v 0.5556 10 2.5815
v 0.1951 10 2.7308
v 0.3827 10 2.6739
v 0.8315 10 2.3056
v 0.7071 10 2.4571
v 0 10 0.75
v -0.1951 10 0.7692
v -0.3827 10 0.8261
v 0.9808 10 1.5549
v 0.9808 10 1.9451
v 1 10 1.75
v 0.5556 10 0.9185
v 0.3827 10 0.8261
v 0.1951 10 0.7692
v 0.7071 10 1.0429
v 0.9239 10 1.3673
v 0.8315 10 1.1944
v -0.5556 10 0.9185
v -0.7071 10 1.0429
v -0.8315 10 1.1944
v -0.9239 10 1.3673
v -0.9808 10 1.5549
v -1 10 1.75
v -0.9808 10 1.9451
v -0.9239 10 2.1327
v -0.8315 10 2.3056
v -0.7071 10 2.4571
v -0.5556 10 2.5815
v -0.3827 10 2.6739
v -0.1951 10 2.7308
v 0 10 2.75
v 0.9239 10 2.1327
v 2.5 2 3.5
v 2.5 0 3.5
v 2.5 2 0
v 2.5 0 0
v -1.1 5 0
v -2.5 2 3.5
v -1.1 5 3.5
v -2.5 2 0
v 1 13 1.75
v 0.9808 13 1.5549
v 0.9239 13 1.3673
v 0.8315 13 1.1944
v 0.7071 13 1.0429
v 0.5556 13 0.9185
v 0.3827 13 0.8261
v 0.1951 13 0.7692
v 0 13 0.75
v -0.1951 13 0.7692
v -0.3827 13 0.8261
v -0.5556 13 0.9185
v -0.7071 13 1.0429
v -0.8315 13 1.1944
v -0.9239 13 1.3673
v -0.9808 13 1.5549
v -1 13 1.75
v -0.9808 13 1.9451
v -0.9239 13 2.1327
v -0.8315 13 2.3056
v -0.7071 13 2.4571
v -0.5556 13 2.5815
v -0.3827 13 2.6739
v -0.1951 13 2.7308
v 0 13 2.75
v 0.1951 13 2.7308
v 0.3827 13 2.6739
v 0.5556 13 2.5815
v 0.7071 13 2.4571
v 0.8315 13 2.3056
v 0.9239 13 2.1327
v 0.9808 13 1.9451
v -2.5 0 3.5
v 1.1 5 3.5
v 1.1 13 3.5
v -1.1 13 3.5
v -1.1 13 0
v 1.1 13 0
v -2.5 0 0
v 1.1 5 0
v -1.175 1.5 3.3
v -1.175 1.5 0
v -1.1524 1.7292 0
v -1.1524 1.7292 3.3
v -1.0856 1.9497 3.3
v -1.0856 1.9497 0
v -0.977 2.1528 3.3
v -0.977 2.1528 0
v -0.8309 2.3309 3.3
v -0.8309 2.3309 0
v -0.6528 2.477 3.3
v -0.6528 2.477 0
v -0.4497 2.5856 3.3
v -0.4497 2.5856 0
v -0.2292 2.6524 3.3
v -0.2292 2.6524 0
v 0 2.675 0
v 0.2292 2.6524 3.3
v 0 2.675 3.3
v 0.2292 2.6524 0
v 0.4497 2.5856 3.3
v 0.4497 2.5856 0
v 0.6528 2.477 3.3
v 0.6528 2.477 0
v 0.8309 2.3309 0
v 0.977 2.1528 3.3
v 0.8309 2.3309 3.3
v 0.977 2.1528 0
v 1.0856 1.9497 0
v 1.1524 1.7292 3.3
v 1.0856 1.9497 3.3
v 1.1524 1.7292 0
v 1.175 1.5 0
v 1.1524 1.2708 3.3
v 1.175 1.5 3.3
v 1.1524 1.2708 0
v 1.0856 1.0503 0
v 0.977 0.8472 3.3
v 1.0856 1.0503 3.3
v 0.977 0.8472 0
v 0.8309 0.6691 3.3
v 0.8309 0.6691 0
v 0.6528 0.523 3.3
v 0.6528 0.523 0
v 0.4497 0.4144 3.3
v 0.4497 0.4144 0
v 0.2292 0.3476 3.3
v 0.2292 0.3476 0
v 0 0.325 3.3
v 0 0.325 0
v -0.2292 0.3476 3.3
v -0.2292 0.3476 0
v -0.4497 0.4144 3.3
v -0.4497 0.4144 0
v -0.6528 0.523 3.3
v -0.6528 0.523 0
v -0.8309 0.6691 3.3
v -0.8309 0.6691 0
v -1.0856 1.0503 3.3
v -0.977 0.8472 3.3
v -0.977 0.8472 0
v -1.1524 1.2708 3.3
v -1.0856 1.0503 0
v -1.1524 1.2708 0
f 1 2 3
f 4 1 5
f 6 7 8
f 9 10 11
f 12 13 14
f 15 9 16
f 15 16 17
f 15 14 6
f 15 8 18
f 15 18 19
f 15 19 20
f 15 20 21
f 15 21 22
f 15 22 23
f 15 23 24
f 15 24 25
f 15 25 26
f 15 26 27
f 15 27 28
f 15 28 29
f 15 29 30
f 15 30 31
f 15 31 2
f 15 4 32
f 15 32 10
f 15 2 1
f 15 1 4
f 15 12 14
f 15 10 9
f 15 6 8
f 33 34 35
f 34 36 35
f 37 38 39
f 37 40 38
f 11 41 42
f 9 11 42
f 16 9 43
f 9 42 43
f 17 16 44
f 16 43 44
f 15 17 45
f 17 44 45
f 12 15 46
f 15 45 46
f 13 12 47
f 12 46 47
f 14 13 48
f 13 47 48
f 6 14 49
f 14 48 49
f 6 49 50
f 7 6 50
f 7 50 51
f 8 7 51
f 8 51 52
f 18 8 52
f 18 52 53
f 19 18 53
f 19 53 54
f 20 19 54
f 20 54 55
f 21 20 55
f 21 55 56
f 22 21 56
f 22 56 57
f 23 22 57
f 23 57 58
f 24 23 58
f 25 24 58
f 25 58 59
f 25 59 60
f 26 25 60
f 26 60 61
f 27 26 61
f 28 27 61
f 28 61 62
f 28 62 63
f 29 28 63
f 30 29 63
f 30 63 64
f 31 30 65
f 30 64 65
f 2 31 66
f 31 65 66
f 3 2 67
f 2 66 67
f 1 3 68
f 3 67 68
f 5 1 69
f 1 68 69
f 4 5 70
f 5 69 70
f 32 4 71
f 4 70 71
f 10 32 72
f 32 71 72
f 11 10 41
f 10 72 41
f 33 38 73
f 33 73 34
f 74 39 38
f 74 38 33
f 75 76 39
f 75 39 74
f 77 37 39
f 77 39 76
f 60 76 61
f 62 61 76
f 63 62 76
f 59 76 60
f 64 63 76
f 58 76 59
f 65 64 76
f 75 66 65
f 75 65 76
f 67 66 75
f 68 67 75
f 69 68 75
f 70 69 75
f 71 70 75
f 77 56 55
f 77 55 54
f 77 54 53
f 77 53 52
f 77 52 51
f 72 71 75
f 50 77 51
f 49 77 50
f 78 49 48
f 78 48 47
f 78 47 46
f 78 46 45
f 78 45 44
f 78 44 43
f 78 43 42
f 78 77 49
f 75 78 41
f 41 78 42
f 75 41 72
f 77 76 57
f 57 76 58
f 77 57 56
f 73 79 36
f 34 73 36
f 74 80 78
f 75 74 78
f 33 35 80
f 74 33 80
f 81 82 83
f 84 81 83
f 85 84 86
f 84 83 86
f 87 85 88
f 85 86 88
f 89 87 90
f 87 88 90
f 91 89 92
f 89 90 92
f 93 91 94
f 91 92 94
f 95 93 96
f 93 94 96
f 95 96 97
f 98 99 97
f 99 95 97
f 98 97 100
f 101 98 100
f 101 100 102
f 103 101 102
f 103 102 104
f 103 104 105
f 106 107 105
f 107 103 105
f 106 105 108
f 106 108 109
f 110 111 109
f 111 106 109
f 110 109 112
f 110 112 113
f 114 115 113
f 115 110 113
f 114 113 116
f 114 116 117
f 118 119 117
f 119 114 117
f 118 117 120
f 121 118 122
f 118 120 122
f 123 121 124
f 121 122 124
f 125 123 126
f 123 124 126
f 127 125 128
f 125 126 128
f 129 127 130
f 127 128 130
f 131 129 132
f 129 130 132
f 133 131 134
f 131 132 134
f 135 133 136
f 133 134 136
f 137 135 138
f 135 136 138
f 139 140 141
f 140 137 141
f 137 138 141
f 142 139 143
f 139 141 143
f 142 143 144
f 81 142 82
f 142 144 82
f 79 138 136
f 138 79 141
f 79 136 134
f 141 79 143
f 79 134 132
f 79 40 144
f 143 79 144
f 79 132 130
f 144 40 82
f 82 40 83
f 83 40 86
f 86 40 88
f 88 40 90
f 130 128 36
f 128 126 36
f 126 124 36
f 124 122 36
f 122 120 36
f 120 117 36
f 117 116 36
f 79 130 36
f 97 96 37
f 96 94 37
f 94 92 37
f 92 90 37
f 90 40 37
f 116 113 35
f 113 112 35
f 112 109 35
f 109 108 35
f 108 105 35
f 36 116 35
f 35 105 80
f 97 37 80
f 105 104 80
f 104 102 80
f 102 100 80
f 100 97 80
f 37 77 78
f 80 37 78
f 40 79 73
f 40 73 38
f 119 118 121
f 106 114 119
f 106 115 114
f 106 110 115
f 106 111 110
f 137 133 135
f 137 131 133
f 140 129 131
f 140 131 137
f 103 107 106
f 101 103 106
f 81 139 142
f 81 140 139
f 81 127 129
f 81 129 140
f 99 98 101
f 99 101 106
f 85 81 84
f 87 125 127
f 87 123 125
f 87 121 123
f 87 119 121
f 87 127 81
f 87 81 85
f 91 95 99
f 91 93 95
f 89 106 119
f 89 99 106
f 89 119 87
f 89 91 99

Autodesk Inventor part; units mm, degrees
ref_plane "YZ Plane" through (0, 0, 0) normal (1, 0, 0) x (0, 1, 0)
ref_plane "XZ Plane" through (0, 0, 0) normal (0, 1, 0) x (-1, 0, 0)
ref_plane "XY Plane" through (0, 0, 0) normal (0, 0, 1) x (1, 0, 0)
sketch "Esquisse1" plane through (0, 0, 0) normal (0, 0, 1) x (1, 0, 0)
  line L0 (0, 13) -> (-1.1, 13)
  line L1 (0, 13) -> (1.1, 13)
  line L2 (0, 0) -> (-2.5, 0)
  line L3 (0, 0) -> (2.5, 0)
  line L4 (2.5, 0) -> (2.5, 2)
  line L5 (2.5, 2) -> (1.1, 5)
  line L6 (-2.5, 0) -> (-2.5, 2)
  line L7 (-2.5, 2) -> (-1.1, 5)
  line L8 (-1.1, 5) -> (-1.1, 13)
  line L9 (1.1, 5) -> (1.1, 13)
  dimension "d0" = 13
  dimension "d1" = 1.1
  dimension "d2" = 1.1
  dimension "d3" = 8
  dimension "d5" = 2.5
  dimension "d6" = 2.5
  dimension "d7" = 2
  dimension "d8" = 2
  dimension "d18" = 8
extrude "Extrusion1" add sketch "Esquisse1" along normal blind 3.5
sketch "Esquisse3" plane through (0, 0, 0) normal (0, 0, -1) x (-1, 0, 0)
  line L0 (1.1, 5) -> (2.5, 2) projected
  line L1 (2.5, 0) -> (-2.5, 0) projected
  line L2 (2.5, 2) -> (2.5, 0) projected
  circle A0 centre (0, 1.5) radius 1.175
  line L3 (0, 0) -> (0, 1.5)
  dimension "d14" = 2.35
  dimension "d15" = 1.5
extrude "Extrusion3" cut sketch "Esquisse3" against normal blind 3.3
sketch "Esquisse4" plane through (-1.1, 13, 0) normal (0, 1, 0) x (1, 0, 0)
  line L0 (2.2, 0) -> (2.2, -3.5) projected
  line L1 (2.2, -1.75) -> (0, -1.75)
  line L2 (0, 0) -> (0, -3.5) projected
  circle A0 centre (1.1, -1.75) radius 1
  point P0 (1.1, 0)
  dimension "d19" = 2
extrude "Extrusion4" cut sketch "Esquisse4" against normal blind 3
properties part number "Socle P-Barre"
